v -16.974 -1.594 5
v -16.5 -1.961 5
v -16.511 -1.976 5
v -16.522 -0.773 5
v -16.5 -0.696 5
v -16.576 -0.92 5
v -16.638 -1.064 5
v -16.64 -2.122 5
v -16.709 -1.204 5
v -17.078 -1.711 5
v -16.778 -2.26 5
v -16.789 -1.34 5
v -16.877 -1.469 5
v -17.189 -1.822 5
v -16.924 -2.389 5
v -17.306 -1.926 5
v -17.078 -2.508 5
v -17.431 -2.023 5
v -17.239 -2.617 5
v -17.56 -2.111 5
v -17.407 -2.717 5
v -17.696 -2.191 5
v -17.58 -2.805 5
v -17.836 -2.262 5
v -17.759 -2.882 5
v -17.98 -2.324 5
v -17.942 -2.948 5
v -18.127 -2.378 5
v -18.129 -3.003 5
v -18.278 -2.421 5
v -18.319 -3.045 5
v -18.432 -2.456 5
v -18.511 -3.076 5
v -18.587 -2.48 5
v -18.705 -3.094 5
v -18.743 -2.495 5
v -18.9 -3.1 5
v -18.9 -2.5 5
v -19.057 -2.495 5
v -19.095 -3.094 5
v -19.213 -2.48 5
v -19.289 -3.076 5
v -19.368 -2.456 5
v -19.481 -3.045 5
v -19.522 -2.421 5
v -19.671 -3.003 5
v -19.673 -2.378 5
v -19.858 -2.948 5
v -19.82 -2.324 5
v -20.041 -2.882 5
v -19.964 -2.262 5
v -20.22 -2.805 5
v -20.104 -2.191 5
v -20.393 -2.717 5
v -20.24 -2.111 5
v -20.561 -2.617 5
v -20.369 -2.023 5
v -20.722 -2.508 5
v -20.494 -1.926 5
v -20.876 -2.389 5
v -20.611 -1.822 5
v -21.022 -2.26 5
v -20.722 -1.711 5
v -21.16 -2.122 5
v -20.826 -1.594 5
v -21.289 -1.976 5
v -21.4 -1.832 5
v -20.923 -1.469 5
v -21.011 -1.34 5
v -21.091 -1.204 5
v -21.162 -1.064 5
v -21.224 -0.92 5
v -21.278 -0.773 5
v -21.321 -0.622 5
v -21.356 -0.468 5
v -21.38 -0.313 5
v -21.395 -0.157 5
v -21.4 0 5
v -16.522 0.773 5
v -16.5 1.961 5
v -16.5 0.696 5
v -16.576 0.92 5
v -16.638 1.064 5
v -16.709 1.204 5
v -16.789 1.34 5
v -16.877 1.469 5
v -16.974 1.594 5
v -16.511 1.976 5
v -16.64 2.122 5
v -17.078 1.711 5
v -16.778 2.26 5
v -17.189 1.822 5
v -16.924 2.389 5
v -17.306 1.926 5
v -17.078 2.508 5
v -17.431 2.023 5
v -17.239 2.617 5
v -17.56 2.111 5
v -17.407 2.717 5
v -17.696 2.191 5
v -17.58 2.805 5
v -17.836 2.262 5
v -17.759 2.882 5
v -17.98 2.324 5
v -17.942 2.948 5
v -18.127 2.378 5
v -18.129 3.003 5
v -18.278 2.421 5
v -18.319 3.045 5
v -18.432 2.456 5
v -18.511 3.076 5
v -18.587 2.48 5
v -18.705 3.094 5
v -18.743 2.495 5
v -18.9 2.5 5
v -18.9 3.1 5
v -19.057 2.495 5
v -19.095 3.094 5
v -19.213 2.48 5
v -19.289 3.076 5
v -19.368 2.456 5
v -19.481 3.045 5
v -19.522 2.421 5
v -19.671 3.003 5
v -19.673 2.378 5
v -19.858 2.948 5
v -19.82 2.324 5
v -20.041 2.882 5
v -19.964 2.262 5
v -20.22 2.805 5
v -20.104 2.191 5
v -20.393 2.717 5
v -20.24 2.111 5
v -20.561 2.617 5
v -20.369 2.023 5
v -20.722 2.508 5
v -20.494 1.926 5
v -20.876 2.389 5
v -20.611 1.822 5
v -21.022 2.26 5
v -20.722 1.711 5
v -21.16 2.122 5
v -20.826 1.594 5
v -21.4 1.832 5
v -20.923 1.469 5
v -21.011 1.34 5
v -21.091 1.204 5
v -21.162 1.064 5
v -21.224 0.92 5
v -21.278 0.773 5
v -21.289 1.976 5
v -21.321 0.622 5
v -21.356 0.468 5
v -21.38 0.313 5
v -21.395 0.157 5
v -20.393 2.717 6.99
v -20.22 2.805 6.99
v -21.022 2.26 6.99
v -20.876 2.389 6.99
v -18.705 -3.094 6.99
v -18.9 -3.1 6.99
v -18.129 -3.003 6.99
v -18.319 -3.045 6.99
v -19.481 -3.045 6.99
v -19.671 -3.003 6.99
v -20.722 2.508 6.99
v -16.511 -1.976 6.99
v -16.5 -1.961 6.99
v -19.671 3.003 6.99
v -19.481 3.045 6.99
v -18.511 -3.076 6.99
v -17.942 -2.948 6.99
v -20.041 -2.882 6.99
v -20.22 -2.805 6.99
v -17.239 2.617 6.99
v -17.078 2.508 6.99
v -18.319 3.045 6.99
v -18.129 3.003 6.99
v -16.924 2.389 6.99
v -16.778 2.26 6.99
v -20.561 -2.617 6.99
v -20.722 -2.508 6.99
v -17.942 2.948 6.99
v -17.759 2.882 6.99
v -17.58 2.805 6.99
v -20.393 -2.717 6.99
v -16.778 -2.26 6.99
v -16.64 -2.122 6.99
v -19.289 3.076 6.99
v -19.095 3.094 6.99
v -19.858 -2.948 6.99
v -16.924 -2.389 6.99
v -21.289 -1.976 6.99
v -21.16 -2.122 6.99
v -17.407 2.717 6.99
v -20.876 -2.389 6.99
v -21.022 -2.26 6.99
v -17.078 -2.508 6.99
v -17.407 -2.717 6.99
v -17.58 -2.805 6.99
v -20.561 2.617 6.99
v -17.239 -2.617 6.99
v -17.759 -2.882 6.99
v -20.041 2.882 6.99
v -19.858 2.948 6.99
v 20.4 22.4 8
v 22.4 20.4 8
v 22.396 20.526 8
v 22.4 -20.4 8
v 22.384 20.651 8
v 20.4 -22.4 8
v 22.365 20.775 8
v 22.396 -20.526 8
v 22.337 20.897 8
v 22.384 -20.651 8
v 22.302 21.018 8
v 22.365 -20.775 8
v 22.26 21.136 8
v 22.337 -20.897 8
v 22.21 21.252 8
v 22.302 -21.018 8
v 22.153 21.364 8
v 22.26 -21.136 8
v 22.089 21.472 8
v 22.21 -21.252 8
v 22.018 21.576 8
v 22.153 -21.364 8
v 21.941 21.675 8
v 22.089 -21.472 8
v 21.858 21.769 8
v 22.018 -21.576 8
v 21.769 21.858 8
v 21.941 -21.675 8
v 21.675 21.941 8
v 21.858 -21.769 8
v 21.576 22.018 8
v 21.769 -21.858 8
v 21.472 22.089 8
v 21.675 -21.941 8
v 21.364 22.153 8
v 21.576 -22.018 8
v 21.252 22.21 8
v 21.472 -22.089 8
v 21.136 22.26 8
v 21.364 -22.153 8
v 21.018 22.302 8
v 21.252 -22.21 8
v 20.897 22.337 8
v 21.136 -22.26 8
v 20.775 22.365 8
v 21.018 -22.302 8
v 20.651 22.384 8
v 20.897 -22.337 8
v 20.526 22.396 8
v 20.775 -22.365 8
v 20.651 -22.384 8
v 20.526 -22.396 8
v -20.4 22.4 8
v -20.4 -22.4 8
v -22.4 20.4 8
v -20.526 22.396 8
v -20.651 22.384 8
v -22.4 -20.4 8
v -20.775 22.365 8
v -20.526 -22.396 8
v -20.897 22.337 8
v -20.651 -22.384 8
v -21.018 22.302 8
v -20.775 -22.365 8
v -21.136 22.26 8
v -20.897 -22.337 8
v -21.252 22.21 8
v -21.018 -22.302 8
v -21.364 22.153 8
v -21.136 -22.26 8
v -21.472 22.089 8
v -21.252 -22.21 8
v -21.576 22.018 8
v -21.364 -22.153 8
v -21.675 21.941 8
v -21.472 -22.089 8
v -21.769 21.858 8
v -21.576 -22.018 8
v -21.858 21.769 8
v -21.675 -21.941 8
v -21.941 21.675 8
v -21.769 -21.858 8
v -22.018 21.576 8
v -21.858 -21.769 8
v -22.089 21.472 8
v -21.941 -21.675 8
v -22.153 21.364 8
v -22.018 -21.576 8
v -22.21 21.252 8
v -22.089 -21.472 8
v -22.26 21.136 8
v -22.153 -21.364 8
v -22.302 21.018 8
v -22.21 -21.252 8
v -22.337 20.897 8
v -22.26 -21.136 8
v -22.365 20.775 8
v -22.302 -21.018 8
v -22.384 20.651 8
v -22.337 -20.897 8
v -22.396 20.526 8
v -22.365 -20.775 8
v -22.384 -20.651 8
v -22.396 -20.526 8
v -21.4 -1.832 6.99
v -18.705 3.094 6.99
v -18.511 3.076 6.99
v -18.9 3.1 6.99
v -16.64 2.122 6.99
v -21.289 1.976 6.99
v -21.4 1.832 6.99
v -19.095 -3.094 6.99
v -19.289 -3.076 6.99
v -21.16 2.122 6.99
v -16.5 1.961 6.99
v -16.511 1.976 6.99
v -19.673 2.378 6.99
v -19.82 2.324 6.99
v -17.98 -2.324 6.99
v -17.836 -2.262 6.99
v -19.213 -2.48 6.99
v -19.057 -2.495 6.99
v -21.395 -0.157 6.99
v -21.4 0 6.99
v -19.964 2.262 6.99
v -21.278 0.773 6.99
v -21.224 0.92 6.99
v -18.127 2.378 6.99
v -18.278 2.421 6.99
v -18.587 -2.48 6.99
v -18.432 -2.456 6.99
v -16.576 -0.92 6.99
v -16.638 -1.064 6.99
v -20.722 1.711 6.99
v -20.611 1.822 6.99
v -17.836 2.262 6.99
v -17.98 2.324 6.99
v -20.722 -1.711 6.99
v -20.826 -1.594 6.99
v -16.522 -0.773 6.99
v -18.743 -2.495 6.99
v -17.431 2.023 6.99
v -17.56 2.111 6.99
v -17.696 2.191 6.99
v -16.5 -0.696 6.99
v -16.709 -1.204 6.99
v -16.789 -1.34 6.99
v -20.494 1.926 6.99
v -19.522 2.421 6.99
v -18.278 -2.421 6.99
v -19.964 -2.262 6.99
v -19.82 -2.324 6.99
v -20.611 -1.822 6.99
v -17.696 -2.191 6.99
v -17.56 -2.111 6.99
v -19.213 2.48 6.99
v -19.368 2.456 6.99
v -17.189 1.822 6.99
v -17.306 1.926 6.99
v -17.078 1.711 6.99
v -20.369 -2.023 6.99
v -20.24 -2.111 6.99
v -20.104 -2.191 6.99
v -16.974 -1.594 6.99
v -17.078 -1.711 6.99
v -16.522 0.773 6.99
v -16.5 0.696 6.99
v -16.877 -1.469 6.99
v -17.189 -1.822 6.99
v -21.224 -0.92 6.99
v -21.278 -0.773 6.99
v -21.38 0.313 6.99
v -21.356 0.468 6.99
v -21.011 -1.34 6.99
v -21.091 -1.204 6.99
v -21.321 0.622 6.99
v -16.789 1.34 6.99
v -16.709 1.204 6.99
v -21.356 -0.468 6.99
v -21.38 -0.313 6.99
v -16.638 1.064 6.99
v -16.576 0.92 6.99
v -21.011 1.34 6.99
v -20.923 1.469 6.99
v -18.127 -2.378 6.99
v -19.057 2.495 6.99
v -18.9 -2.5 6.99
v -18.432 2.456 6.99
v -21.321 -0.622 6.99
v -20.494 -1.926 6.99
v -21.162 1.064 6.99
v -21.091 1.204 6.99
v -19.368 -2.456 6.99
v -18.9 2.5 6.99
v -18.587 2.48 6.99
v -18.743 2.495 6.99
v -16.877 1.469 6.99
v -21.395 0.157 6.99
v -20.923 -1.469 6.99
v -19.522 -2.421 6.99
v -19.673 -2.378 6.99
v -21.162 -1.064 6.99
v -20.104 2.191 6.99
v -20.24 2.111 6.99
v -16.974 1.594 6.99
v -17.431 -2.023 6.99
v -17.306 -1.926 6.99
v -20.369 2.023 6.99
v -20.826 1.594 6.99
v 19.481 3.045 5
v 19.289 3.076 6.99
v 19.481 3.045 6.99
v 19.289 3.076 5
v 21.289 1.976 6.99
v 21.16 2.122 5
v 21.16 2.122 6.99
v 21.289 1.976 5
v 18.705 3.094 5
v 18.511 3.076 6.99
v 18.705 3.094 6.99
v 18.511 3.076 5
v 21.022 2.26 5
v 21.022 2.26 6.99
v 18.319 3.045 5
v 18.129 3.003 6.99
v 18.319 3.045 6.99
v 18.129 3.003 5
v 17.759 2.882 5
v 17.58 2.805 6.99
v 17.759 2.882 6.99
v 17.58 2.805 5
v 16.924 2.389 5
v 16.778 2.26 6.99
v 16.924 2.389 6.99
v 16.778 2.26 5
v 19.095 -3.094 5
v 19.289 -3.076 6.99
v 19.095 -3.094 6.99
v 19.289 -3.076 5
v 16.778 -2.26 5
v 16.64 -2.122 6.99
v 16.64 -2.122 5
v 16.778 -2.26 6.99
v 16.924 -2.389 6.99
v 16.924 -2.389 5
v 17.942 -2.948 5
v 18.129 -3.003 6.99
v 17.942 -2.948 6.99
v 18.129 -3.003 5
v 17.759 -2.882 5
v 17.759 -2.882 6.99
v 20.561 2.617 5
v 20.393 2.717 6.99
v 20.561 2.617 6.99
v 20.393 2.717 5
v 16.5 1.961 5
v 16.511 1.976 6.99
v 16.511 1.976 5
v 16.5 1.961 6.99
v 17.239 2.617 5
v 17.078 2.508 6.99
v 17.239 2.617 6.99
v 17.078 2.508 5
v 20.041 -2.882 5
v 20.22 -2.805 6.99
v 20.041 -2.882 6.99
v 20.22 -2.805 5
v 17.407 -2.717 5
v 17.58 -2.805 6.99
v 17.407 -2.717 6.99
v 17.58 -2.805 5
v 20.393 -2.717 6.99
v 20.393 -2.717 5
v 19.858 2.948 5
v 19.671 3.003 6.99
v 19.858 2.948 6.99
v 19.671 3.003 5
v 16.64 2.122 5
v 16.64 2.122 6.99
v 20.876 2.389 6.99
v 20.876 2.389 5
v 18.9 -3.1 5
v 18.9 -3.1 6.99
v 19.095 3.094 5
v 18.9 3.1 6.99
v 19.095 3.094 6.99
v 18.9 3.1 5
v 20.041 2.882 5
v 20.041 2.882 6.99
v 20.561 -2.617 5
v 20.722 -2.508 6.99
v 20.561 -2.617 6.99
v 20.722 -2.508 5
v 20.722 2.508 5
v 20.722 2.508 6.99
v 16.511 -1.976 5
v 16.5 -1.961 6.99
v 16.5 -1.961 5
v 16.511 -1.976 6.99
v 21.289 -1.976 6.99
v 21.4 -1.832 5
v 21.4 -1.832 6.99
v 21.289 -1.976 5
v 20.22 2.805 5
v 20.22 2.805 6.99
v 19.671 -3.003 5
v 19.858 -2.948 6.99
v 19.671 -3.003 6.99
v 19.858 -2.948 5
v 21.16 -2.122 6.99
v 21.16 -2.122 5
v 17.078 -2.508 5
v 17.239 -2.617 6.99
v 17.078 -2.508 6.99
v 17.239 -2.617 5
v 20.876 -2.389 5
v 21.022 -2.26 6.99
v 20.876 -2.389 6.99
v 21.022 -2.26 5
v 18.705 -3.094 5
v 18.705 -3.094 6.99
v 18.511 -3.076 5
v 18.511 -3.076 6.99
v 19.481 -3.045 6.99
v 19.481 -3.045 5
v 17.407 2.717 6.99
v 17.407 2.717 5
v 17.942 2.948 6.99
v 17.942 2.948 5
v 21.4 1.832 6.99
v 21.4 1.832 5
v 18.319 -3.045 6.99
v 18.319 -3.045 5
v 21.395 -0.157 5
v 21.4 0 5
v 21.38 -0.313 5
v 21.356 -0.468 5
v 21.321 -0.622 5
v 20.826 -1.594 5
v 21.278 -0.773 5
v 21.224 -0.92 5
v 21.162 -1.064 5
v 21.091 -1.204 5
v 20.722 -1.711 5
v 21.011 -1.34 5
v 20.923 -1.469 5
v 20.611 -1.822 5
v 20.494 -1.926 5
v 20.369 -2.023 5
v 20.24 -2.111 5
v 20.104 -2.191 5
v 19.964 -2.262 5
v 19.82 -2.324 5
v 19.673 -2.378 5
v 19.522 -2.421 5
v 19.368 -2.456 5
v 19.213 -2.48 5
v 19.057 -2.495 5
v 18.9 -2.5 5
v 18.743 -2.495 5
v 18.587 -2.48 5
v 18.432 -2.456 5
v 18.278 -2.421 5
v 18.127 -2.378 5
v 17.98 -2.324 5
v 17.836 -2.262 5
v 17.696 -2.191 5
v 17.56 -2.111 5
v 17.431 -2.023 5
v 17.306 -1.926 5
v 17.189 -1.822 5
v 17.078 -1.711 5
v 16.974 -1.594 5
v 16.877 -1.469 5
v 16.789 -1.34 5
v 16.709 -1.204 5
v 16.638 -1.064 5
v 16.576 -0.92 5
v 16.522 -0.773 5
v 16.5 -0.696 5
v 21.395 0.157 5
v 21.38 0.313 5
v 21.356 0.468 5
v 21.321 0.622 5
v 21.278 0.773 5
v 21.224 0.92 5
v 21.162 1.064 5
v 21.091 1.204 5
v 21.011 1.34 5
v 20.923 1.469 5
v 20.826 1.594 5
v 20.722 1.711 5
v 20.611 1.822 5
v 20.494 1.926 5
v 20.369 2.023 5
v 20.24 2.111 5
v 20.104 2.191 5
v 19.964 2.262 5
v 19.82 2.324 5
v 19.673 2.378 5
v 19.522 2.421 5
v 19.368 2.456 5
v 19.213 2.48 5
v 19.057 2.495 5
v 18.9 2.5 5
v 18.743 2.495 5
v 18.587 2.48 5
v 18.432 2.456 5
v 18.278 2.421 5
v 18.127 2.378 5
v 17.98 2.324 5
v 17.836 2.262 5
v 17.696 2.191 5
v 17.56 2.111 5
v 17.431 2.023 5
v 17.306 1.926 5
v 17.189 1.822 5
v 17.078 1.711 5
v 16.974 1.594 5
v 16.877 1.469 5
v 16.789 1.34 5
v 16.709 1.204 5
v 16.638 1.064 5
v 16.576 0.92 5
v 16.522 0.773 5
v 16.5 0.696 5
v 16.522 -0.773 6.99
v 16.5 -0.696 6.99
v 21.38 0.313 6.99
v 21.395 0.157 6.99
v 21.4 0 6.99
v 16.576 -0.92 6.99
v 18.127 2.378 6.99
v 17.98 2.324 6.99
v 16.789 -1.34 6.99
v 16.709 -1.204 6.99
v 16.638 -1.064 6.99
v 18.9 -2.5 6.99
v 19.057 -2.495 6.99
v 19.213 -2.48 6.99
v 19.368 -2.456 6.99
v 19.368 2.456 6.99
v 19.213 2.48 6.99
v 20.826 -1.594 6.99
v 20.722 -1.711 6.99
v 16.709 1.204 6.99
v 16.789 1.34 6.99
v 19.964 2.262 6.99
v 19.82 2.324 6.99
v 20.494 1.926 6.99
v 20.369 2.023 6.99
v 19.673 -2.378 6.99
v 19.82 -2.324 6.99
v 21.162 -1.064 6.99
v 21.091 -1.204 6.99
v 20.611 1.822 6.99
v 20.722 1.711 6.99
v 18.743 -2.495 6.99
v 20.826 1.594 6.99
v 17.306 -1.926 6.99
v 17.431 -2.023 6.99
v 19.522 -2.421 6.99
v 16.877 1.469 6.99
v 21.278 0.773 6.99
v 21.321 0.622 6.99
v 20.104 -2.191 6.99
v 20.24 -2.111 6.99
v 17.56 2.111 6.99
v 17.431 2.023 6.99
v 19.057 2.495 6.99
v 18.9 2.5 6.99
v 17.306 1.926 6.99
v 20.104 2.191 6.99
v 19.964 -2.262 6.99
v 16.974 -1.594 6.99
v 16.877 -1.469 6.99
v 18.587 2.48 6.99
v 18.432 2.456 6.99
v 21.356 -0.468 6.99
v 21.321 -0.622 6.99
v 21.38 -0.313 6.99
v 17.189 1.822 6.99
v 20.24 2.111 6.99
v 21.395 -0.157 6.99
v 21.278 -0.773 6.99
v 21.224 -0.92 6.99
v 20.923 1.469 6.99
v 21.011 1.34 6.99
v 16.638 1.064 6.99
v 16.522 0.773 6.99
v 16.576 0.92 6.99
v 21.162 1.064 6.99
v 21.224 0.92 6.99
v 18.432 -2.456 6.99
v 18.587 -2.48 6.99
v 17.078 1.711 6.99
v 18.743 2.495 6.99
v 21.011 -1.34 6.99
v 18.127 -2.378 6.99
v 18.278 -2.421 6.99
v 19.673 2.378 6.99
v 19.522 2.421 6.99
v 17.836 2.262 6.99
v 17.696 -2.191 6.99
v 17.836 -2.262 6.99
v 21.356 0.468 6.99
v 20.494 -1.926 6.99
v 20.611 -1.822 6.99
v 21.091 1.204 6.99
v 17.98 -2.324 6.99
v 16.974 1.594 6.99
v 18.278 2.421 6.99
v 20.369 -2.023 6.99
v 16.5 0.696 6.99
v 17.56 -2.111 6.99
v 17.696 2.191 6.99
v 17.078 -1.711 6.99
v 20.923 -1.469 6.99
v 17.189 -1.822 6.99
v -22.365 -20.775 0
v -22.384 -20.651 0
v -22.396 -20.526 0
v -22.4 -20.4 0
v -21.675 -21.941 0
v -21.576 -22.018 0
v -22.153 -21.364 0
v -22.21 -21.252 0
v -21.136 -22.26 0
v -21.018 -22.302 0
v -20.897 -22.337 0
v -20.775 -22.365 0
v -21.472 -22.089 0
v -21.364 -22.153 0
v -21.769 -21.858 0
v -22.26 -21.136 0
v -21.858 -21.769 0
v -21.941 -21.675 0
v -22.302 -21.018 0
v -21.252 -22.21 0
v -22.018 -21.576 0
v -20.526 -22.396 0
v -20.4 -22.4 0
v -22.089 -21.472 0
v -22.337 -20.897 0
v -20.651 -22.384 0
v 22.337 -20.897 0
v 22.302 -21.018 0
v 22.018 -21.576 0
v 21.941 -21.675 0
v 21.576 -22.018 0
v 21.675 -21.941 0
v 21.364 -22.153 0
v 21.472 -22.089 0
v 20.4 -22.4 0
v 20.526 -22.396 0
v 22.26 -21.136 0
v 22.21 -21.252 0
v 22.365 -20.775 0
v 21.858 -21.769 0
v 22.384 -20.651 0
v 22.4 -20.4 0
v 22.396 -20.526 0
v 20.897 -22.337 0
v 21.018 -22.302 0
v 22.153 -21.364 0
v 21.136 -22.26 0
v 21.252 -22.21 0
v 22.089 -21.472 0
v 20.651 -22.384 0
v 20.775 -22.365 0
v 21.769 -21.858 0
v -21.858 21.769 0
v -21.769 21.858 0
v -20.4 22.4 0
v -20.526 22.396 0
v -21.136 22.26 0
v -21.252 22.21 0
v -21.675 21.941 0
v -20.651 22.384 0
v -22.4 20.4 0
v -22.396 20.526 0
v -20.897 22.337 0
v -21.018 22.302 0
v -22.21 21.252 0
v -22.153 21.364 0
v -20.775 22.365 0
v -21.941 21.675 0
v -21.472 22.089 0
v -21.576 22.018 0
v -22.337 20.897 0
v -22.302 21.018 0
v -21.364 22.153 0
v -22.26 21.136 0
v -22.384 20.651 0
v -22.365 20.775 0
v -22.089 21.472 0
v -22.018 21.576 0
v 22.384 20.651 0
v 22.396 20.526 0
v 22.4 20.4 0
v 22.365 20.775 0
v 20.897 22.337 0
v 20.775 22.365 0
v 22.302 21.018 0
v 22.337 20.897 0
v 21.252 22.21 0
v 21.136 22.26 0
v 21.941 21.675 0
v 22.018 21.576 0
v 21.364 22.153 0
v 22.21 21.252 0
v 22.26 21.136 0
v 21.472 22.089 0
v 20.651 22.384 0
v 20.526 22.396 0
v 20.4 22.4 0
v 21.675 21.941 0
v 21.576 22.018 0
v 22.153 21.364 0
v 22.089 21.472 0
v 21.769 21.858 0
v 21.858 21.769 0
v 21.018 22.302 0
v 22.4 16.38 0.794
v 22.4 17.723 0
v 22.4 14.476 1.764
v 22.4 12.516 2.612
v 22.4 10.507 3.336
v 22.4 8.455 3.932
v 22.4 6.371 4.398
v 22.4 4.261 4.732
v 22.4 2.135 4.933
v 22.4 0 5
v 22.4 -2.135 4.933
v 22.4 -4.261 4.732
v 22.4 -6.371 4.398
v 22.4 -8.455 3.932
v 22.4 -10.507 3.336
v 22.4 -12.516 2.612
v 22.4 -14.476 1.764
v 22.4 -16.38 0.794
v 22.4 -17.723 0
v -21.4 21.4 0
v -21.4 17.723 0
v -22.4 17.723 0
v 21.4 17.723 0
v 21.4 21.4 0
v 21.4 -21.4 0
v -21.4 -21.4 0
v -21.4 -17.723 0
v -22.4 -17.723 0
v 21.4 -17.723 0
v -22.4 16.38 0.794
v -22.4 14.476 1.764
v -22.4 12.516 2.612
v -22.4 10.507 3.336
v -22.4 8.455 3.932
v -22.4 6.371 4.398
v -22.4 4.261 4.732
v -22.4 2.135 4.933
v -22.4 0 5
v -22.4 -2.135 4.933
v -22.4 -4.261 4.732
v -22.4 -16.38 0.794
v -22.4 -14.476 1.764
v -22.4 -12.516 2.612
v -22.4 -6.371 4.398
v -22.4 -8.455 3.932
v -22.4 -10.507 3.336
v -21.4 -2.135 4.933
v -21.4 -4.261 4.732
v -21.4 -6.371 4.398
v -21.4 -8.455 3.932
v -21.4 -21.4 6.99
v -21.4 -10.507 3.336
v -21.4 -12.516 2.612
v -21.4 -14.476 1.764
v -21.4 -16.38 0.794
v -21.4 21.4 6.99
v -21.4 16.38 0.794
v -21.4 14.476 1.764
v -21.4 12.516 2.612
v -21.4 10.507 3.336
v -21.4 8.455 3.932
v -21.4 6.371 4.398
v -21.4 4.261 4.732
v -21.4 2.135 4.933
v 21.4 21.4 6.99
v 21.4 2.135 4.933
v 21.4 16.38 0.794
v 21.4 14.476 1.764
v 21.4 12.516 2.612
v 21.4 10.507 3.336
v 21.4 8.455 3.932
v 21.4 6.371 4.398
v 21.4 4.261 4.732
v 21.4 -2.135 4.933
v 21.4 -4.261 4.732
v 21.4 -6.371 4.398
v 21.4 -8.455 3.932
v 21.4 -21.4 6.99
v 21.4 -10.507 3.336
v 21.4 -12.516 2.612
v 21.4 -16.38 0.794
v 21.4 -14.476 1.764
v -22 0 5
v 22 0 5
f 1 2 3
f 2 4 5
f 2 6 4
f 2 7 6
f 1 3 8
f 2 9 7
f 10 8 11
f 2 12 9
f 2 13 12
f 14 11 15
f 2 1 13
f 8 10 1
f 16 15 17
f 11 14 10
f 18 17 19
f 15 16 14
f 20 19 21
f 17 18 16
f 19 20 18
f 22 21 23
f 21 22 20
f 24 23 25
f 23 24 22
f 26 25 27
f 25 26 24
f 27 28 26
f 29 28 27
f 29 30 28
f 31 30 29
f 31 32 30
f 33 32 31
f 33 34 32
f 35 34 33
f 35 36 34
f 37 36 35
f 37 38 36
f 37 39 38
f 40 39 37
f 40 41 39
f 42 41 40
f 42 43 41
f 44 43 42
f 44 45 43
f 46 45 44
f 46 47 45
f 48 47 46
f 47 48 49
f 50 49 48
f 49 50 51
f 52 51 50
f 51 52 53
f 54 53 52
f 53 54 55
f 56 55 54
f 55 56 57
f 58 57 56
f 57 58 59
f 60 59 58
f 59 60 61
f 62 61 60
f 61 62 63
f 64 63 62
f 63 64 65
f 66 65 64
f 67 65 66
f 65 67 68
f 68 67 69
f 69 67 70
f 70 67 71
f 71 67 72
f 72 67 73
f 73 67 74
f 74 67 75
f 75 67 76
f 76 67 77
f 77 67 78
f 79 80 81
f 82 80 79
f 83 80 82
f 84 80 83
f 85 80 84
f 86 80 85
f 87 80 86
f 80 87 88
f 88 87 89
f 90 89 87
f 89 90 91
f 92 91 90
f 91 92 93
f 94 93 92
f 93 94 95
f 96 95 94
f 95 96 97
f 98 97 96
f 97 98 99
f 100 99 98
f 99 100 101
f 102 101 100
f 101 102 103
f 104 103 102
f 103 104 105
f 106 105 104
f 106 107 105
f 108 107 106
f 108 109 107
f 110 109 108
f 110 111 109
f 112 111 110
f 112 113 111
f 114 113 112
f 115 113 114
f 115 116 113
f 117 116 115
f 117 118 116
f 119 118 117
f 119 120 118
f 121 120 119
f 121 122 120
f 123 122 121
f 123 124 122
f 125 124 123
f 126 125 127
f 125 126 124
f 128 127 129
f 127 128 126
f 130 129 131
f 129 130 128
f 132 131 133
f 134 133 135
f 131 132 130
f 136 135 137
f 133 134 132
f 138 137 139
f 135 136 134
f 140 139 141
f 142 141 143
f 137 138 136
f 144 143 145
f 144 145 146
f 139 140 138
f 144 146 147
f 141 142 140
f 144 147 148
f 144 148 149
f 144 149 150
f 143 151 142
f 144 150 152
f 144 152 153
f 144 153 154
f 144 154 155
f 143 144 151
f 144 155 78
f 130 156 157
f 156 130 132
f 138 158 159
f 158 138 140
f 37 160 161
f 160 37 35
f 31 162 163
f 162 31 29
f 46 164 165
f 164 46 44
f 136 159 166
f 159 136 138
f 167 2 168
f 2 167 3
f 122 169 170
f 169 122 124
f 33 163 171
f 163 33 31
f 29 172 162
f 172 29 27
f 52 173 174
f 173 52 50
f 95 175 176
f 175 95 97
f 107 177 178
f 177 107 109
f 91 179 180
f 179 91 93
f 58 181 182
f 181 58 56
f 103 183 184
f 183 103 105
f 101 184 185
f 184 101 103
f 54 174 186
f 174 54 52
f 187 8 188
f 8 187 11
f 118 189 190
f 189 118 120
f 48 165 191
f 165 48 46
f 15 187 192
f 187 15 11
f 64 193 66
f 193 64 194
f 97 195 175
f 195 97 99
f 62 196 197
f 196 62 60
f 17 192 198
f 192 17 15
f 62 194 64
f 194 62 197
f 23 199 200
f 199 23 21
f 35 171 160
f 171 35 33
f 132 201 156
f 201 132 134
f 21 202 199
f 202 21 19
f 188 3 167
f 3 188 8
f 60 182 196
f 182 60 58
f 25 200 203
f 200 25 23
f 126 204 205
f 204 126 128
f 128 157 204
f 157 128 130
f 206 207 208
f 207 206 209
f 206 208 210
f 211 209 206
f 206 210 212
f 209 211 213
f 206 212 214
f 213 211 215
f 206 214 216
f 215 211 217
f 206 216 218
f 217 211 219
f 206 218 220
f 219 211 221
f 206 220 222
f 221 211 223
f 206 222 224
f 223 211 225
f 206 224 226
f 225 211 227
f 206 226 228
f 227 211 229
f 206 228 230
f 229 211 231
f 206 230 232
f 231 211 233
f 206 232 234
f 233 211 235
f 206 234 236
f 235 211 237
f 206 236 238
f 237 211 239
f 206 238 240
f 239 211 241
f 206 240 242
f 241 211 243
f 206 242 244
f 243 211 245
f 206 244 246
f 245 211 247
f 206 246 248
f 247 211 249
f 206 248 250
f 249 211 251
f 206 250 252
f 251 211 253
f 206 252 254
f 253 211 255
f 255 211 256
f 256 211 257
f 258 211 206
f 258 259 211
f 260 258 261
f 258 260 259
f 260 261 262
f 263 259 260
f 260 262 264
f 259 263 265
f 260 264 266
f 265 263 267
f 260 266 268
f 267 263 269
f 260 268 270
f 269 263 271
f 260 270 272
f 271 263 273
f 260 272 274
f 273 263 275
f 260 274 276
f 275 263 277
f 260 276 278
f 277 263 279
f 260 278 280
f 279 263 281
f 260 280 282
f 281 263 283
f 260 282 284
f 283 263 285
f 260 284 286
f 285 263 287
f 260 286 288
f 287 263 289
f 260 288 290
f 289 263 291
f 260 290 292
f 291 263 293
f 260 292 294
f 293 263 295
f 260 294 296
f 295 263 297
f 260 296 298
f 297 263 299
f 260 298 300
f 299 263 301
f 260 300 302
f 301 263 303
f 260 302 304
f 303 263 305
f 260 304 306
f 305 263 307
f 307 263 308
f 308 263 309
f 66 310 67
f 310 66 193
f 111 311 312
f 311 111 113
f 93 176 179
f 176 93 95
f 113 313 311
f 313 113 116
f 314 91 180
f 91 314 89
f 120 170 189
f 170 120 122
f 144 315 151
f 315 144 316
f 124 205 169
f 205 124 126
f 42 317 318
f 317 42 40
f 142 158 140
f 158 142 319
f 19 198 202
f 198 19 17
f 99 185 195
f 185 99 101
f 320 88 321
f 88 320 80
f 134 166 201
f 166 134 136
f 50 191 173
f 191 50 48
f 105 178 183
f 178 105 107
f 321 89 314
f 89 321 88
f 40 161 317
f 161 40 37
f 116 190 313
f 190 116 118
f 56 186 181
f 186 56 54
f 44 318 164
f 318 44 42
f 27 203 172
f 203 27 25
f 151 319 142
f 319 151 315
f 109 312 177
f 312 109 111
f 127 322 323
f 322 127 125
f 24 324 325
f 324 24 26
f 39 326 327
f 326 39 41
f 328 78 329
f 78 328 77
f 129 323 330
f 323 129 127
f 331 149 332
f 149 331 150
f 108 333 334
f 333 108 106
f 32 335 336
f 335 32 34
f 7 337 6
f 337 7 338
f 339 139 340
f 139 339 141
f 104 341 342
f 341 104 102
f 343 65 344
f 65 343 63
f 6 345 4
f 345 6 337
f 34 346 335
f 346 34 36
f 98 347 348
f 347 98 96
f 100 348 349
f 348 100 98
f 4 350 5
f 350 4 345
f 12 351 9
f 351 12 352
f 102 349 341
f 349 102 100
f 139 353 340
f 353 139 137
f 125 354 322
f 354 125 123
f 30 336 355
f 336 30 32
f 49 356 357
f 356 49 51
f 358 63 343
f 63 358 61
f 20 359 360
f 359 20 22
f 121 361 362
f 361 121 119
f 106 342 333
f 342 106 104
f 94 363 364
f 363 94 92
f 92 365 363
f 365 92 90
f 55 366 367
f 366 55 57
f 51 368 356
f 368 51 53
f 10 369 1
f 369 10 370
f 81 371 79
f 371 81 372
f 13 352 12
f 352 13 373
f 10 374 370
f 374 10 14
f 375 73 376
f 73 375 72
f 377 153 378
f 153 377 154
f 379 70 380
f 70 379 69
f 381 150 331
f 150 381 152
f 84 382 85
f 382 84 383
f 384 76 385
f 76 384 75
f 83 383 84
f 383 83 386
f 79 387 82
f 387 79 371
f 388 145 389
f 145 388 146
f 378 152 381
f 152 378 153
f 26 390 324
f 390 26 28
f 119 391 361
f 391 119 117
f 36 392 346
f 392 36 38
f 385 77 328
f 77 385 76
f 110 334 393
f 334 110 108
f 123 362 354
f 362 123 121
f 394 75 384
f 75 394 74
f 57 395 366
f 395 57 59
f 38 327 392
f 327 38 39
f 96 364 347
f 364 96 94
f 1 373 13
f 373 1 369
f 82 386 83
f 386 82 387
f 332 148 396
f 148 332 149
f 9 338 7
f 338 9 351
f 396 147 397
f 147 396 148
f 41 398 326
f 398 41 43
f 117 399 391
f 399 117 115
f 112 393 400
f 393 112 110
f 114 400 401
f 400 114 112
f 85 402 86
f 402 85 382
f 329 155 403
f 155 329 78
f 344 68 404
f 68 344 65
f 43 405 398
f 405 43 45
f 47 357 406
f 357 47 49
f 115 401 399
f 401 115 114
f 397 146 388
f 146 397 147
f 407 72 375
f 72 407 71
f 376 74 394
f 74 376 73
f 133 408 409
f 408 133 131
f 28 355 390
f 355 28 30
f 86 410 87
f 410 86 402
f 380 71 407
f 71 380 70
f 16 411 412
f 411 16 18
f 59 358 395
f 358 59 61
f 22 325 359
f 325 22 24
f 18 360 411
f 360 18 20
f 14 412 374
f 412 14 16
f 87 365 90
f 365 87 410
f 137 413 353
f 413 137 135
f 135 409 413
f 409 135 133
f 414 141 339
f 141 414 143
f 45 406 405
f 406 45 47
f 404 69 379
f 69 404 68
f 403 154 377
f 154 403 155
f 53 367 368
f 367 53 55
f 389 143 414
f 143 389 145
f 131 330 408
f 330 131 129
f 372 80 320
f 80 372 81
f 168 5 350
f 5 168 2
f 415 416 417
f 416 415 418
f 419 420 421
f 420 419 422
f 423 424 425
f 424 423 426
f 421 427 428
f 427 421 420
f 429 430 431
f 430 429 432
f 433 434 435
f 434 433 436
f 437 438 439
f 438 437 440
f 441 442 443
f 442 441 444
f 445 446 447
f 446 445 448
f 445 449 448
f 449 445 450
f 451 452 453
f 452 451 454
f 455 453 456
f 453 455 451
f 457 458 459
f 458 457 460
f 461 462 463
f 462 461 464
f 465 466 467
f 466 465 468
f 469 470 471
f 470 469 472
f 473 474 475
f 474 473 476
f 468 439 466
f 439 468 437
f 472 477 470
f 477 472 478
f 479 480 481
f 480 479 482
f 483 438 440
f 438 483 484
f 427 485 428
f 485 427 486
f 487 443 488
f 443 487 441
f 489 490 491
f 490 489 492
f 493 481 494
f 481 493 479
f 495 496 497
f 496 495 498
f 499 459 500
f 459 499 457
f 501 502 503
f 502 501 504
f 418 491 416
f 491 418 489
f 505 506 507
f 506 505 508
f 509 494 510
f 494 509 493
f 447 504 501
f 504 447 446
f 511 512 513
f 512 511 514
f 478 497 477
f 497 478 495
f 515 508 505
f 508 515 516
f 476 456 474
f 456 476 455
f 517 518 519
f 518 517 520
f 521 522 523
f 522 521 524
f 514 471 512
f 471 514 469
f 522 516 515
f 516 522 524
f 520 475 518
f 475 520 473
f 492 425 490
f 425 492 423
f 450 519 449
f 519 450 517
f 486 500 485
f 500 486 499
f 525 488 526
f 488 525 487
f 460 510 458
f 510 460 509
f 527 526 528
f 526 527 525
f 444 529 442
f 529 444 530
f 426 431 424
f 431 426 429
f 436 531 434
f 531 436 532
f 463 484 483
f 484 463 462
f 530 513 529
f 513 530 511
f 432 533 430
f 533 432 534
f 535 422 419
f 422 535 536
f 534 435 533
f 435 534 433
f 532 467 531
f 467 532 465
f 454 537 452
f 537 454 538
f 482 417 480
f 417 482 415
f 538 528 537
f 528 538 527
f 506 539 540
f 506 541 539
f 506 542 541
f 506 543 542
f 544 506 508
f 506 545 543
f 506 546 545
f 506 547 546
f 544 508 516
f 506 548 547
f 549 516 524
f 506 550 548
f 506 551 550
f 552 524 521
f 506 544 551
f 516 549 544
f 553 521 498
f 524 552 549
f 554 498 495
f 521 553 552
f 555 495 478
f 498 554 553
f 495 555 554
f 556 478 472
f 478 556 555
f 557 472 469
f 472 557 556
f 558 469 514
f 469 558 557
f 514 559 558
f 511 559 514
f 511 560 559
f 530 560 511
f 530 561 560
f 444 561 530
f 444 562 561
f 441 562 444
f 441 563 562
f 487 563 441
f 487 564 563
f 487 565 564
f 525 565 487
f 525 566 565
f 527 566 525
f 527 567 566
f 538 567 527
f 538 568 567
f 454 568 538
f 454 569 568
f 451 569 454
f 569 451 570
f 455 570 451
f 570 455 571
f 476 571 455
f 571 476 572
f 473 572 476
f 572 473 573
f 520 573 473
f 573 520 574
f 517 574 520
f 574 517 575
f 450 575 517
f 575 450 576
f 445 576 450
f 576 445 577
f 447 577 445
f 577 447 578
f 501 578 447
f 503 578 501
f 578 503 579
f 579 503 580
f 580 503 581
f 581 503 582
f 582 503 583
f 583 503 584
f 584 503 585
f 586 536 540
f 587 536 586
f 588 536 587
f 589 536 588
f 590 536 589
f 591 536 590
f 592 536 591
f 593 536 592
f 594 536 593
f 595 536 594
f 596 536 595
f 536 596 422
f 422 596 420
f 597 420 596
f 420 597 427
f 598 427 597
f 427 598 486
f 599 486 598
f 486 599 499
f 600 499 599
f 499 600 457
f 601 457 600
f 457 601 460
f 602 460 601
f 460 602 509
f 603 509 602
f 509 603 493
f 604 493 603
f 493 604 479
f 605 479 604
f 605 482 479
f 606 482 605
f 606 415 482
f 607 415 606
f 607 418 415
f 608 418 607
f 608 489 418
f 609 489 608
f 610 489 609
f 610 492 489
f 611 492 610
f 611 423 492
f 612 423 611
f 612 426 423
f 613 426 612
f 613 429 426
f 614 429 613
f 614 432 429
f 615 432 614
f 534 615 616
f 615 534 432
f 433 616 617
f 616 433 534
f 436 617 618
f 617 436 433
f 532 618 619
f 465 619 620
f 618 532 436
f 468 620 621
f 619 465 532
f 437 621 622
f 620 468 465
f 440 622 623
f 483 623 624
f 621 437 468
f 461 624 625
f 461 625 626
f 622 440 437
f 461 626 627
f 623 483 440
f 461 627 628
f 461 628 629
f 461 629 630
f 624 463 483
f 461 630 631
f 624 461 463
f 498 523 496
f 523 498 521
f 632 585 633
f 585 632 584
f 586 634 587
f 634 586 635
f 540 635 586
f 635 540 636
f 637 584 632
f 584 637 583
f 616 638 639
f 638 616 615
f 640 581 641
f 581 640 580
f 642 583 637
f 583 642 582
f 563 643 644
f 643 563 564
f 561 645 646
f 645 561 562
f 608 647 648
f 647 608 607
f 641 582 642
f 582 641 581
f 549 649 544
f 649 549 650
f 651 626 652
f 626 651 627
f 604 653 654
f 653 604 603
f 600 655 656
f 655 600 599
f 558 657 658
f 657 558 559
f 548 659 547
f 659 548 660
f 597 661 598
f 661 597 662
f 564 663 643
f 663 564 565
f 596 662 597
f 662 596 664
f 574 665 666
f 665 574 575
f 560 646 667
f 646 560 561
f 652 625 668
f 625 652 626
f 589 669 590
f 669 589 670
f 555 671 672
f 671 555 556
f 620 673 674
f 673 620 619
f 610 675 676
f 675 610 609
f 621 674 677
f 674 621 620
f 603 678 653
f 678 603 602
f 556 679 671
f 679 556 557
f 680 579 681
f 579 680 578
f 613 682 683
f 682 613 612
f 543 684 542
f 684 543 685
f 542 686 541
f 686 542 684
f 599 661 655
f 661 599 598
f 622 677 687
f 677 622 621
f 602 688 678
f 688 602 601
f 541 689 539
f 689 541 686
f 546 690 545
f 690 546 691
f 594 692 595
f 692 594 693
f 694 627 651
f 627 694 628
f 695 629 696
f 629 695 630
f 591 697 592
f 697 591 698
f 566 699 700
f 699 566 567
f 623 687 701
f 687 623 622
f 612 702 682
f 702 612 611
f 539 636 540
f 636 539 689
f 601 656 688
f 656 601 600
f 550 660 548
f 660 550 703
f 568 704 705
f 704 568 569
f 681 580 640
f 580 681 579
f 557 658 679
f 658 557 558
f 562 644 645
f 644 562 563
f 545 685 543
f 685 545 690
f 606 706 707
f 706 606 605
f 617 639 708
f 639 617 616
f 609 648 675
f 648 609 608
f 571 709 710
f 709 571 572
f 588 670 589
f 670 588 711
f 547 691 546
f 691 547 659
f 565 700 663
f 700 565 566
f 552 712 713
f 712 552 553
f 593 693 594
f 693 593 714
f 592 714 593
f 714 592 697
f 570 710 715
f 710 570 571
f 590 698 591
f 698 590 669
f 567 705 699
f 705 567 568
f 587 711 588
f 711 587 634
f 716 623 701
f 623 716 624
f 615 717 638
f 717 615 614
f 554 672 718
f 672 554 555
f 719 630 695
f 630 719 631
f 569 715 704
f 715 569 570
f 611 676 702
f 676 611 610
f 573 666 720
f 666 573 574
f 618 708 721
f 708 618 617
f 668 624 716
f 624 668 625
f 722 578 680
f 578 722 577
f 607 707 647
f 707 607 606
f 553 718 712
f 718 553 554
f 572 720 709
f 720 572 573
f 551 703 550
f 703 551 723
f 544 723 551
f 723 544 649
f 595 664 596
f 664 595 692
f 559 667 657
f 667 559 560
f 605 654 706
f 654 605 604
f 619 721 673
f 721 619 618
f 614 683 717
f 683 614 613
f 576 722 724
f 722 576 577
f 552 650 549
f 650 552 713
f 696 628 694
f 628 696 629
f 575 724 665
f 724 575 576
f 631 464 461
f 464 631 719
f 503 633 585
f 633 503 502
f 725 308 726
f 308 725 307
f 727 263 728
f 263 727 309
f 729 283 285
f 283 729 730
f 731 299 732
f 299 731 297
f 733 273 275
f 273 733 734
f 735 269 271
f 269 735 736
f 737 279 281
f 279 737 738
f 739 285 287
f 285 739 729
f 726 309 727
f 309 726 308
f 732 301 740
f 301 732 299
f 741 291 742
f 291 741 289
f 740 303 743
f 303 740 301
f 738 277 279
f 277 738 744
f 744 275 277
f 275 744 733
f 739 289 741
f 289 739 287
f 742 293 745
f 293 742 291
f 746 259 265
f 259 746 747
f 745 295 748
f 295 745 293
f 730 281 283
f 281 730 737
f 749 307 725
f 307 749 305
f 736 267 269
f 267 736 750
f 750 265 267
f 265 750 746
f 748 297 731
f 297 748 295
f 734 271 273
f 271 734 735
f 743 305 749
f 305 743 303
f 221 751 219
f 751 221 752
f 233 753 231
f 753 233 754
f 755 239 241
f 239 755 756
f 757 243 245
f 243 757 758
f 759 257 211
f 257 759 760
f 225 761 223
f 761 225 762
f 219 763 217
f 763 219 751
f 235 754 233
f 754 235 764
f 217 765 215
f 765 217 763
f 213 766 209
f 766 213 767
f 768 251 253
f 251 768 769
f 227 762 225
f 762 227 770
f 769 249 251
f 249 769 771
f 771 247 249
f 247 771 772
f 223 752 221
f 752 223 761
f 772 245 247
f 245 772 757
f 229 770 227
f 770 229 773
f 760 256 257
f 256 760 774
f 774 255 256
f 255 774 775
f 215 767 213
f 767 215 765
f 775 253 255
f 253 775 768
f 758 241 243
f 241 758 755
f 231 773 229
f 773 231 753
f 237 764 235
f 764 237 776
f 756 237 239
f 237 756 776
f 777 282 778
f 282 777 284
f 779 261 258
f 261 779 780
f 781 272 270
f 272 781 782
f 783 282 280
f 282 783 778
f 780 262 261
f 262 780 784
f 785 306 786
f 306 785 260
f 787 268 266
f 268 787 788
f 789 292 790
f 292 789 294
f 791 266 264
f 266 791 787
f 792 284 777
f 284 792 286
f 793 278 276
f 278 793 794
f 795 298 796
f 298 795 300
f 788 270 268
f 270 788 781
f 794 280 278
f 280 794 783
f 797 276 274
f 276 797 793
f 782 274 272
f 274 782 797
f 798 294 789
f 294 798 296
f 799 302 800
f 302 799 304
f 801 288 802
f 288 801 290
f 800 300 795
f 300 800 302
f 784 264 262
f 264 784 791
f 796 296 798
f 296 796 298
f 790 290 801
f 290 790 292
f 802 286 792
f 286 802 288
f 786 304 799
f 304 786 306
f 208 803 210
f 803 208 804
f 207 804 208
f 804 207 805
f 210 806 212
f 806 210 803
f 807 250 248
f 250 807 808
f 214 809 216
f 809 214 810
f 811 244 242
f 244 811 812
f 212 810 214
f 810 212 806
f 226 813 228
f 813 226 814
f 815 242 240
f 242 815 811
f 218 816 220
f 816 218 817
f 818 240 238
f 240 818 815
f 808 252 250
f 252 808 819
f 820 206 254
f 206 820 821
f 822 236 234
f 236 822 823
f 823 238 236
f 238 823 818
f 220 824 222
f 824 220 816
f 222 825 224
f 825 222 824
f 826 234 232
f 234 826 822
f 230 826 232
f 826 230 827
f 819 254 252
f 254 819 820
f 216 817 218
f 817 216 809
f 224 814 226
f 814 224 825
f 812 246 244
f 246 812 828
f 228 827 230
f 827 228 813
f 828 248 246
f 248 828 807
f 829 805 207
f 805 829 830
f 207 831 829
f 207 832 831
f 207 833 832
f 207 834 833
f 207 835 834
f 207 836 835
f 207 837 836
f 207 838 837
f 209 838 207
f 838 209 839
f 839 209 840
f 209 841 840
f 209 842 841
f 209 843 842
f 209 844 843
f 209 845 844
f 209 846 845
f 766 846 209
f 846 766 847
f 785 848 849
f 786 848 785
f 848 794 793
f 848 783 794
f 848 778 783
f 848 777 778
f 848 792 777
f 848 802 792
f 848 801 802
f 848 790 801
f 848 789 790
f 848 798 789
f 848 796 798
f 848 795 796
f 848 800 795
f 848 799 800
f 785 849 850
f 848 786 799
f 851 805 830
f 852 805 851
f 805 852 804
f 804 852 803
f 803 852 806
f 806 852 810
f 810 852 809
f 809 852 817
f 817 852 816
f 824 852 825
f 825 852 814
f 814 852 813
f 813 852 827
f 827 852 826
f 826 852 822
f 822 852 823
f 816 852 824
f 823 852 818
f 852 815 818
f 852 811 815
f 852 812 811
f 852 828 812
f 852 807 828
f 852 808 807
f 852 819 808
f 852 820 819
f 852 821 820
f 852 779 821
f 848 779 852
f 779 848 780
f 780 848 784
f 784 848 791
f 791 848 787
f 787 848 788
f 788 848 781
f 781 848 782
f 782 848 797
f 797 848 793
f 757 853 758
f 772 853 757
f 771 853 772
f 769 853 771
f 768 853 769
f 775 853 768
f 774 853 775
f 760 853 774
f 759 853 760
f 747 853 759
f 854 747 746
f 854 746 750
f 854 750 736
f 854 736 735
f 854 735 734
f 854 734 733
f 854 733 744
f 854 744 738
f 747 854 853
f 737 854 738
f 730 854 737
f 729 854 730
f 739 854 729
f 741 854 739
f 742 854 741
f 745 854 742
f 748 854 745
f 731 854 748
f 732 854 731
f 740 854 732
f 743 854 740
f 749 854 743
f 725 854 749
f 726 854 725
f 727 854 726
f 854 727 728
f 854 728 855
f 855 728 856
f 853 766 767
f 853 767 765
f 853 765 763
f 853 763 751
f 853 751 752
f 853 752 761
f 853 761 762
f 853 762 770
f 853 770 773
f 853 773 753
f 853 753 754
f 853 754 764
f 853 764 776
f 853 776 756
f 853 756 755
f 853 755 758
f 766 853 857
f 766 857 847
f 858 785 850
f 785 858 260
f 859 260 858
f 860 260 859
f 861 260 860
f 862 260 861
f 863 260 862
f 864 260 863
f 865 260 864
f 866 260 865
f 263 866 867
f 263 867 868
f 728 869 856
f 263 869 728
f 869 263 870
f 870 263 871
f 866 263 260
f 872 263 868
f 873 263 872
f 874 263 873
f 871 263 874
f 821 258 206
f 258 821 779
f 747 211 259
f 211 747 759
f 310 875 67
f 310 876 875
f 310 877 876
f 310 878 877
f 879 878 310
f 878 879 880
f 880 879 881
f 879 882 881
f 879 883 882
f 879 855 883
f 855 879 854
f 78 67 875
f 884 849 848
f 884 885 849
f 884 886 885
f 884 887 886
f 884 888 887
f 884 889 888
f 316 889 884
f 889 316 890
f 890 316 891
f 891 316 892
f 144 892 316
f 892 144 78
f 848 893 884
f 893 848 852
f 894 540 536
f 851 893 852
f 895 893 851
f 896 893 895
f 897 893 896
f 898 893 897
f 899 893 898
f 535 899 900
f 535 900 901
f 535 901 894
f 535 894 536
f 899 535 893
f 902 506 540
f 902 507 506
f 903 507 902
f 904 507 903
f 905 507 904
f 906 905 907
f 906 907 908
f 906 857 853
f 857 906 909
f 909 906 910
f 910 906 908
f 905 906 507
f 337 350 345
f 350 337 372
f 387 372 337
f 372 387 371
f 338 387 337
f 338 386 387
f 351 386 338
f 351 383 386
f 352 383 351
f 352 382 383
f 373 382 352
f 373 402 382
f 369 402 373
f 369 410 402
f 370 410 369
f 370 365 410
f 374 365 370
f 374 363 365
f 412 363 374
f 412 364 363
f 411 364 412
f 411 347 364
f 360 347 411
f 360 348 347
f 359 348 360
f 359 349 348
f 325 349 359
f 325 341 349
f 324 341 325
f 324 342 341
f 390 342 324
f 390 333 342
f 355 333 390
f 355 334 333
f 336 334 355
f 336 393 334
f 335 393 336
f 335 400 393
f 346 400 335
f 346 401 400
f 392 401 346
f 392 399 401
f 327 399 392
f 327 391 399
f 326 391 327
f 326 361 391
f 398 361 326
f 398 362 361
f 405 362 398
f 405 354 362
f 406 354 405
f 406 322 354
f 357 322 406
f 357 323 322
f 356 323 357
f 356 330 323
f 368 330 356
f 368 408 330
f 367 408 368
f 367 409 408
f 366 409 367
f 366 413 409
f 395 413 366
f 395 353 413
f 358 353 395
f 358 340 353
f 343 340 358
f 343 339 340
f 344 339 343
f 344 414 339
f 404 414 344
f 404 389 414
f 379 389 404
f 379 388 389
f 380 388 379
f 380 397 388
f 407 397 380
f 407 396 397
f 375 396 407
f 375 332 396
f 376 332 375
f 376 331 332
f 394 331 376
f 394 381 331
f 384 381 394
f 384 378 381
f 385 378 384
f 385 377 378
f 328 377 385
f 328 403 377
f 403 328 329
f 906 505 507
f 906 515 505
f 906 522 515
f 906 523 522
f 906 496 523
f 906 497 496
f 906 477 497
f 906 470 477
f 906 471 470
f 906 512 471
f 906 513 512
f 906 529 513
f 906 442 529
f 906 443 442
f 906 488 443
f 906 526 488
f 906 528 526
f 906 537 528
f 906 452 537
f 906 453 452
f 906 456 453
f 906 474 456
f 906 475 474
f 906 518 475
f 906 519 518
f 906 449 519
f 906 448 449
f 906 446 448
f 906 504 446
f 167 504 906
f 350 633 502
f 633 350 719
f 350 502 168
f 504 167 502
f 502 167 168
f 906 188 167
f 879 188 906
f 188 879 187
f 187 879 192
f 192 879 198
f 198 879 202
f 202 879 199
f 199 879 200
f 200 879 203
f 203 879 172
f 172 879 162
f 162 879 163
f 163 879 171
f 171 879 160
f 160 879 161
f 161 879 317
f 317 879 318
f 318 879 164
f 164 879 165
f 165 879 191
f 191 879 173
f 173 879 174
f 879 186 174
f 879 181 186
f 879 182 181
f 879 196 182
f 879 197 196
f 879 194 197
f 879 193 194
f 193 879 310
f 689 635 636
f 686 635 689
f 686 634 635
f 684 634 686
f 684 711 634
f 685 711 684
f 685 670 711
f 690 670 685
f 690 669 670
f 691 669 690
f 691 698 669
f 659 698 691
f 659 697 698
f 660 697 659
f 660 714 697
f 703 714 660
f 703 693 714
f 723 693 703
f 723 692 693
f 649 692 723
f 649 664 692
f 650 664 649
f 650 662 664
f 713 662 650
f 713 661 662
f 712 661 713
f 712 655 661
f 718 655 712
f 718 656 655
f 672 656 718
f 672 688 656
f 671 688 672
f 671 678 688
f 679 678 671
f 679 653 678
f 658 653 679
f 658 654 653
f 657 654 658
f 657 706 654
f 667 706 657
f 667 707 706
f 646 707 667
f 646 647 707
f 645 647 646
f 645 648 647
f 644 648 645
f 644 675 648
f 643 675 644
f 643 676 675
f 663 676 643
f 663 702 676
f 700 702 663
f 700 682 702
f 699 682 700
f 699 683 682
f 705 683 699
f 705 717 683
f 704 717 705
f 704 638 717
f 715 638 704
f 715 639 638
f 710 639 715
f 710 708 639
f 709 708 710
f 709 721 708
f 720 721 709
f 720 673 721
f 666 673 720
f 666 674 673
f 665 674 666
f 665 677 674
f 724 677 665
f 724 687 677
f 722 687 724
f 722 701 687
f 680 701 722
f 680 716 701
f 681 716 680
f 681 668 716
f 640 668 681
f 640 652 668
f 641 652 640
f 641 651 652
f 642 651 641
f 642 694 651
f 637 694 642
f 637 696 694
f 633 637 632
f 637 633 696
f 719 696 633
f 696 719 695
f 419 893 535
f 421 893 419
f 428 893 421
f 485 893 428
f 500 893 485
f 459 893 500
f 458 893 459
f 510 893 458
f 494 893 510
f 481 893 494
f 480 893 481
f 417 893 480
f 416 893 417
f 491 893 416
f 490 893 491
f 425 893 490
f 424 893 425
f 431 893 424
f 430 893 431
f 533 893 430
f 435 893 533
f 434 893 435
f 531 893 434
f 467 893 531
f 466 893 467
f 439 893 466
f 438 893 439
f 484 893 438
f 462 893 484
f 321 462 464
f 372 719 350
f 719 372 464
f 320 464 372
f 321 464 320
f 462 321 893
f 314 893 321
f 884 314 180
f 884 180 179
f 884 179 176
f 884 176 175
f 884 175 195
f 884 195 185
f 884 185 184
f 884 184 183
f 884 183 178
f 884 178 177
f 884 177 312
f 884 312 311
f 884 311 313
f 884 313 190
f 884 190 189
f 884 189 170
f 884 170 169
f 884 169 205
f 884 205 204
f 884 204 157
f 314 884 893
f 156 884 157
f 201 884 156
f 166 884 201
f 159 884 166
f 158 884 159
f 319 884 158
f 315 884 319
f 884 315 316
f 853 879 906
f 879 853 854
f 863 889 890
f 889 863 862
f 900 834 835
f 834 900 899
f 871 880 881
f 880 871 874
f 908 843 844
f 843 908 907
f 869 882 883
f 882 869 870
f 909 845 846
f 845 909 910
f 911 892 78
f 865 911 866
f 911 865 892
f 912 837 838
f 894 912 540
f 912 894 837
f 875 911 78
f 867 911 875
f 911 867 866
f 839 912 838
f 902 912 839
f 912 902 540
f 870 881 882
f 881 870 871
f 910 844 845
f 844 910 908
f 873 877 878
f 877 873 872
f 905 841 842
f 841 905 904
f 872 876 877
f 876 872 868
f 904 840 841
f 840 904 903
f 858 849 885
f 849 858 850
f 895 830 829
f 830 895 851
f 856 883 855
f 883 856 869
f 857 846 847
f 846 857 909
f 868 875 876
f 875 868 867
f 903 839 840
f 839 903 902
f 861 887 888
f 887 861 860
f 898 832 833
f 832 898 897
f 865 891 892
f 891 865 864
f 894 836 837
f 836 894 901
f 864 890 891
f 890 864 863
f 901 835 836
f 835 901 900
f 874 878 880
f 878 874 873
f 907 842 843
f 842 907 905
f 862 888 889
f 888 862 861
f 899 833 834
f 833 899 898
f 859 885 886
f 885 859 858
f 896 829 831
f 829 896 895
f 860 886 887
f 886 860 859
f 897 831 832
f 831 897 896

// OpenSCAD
TangentSize=44.8;
TangentOuterR=150;
TangentSide=8;
TangentAngle=0;
TangentRDepth=1.5;
TangenWallThickness=1.0;
manifoldfix=0.01;
FiletTangentR=2;
MagnetCylinderR=2.5;
MagnetCylinderHolderHeight=3;
MagnetCylinderDepth=3;
MagnetCylinderThickness=0.6;
MagnetCylinderOffset=2.0;
ScrewDistance=37.8;
MagnetHolderOffset=-0.7;
LockHoleOffset = (TangentSize/2-18);
LockHoleLength= 8;
LockHoleD=4;
$fn=100;




Tangent();

module Tangent(){

difference(){
translate([-ScrewDistance/2,0,TangentSide-MagnetCylinderHolderHeight])
cylinder(h=MagnetCylinderHolderHeight, r=MagnetCylinderR+MagnetCylinderThickness, center=false);
    
translate([-ScrewDistance/2,0,-manifoldfix+TangentSide-MagnetCylinderDepth])
cylinder(h=MagnetCylinderHolderHeight, r=MagnetCylinderR, center=false);

translate([-ScrewDistance/2+2.4,-TangentSide/2,-manifoldfix])
cube([TangentSide,TangentSide,TangentSide], center=false);

}
difference(){
translate([ScrewDistance/2,0,TangentSide-MagnetCylinderHolderHeight])
cylinder(h=MagnetCylinderHolderHeight, r=MagnetCylinderR+MagnetCylinderThickness, center=false);
    
translate([ScrewDistance/2,0,-manifoldfix+TangentSide-MagnetCylinderDepth])
cylinder(h=MagnetCylinderHolderHeight, r=MagnetCylinderR, center=false);

translate([ScrewDistance/2-TangentSide-2.4,-TangentSide/2,-manifoldfix])
cube([TangentSide,TangentSide,TangentSide], center=false);

}





difference(){
translate([0,0,TangentSide/2])
cube([TangentSize,TangentSize,TangentSide], center=true);


translate([0,0,-manifoldfix])
rotate([0,0,45])
cylinder(h=(TangentSide-TangenWallThickness), r=sqrt(2)*(TangentSize-2*TangenWallThickness)/2,$fn=4, center=false);


    
    
// Cylinder center
translate([0,0,-29])
  rotate([0,90,0])
cylinder(h=TangentSize*2, r=34, center=true);  
    

// Angled sides of tagent
translate([0,-TangentSize/2-10/2,0])
rotate([-TangentAngle,0,0])
cube([TangentSize+manifoldfix,10,TangentSide*3], center =true);
    
translate([0,+TangentSize/2+10/2,0])
rotate([TangentAngle,0,0])
cube([TangentSize+manifoldfix,10,TangentSide*3], center =true);
// Filet of corners
TangentCornerFilet();

}



}


// Corner filet 
module TangentCornerFilet(){
difference(){
TangentCornerFiletPrep();
translate([-TangentSize/2+FiletTangentR,-TangentSize/2+FiletTangentR,0])
rotate([-TangentAngle,0,0])
cylinder(h=TangentSide*3,r=FiletTangentR,center=true);
translate([TangentSize/2-FiletTangentR,-TangentSize/2+FiletTangentR,0])
rotate([-TangentAngle,0,0])
cylinder(h=TangentSide*3,r=FiletTangentR,center=true);
translate([-TangentSize/2+FiletTangentR,TangentSize/2-FiletTangentR,0])
rotate([TangentAngle,0,0])
cylinder(h=TangentSide*3,r=FiletTangentR,center=true);
translate([TangentSize/2-FiletTangentR,TangentSize/2-FiletTangentR,0])
rotate([TangentAngle,0,0])
cylinder(h=TangentSide*3,r=FiletTangentR,center=true);
}
}

module TangentCornerFiletPrep(){
    translate([-TangentSize/2,-TangentSize/2,0])
rotate([-TangentAngle,0,0])
cylinder(h=TangentSide*3,r=FiletTangentR,center=true);
translate([TangentSize/2,-TangentSize/2,0])
rotate([-TangentAngle,0,0])
cylinder(h=TangentSide*3,r=FiletTangentR,center=true);
translate([-TangentSize/2,TangentSize/2,0])
rotate([TangentAngle,0,0])
cylinder(h=TangentSide*3,r=FiletTangentR,center=true);
translate([TangentSize/2,TangentSize/2,0])
rotate([TangentAngle,0,0])
cylinder(h=TangentSide*3,r=FiletTangentR,center=true);
}
